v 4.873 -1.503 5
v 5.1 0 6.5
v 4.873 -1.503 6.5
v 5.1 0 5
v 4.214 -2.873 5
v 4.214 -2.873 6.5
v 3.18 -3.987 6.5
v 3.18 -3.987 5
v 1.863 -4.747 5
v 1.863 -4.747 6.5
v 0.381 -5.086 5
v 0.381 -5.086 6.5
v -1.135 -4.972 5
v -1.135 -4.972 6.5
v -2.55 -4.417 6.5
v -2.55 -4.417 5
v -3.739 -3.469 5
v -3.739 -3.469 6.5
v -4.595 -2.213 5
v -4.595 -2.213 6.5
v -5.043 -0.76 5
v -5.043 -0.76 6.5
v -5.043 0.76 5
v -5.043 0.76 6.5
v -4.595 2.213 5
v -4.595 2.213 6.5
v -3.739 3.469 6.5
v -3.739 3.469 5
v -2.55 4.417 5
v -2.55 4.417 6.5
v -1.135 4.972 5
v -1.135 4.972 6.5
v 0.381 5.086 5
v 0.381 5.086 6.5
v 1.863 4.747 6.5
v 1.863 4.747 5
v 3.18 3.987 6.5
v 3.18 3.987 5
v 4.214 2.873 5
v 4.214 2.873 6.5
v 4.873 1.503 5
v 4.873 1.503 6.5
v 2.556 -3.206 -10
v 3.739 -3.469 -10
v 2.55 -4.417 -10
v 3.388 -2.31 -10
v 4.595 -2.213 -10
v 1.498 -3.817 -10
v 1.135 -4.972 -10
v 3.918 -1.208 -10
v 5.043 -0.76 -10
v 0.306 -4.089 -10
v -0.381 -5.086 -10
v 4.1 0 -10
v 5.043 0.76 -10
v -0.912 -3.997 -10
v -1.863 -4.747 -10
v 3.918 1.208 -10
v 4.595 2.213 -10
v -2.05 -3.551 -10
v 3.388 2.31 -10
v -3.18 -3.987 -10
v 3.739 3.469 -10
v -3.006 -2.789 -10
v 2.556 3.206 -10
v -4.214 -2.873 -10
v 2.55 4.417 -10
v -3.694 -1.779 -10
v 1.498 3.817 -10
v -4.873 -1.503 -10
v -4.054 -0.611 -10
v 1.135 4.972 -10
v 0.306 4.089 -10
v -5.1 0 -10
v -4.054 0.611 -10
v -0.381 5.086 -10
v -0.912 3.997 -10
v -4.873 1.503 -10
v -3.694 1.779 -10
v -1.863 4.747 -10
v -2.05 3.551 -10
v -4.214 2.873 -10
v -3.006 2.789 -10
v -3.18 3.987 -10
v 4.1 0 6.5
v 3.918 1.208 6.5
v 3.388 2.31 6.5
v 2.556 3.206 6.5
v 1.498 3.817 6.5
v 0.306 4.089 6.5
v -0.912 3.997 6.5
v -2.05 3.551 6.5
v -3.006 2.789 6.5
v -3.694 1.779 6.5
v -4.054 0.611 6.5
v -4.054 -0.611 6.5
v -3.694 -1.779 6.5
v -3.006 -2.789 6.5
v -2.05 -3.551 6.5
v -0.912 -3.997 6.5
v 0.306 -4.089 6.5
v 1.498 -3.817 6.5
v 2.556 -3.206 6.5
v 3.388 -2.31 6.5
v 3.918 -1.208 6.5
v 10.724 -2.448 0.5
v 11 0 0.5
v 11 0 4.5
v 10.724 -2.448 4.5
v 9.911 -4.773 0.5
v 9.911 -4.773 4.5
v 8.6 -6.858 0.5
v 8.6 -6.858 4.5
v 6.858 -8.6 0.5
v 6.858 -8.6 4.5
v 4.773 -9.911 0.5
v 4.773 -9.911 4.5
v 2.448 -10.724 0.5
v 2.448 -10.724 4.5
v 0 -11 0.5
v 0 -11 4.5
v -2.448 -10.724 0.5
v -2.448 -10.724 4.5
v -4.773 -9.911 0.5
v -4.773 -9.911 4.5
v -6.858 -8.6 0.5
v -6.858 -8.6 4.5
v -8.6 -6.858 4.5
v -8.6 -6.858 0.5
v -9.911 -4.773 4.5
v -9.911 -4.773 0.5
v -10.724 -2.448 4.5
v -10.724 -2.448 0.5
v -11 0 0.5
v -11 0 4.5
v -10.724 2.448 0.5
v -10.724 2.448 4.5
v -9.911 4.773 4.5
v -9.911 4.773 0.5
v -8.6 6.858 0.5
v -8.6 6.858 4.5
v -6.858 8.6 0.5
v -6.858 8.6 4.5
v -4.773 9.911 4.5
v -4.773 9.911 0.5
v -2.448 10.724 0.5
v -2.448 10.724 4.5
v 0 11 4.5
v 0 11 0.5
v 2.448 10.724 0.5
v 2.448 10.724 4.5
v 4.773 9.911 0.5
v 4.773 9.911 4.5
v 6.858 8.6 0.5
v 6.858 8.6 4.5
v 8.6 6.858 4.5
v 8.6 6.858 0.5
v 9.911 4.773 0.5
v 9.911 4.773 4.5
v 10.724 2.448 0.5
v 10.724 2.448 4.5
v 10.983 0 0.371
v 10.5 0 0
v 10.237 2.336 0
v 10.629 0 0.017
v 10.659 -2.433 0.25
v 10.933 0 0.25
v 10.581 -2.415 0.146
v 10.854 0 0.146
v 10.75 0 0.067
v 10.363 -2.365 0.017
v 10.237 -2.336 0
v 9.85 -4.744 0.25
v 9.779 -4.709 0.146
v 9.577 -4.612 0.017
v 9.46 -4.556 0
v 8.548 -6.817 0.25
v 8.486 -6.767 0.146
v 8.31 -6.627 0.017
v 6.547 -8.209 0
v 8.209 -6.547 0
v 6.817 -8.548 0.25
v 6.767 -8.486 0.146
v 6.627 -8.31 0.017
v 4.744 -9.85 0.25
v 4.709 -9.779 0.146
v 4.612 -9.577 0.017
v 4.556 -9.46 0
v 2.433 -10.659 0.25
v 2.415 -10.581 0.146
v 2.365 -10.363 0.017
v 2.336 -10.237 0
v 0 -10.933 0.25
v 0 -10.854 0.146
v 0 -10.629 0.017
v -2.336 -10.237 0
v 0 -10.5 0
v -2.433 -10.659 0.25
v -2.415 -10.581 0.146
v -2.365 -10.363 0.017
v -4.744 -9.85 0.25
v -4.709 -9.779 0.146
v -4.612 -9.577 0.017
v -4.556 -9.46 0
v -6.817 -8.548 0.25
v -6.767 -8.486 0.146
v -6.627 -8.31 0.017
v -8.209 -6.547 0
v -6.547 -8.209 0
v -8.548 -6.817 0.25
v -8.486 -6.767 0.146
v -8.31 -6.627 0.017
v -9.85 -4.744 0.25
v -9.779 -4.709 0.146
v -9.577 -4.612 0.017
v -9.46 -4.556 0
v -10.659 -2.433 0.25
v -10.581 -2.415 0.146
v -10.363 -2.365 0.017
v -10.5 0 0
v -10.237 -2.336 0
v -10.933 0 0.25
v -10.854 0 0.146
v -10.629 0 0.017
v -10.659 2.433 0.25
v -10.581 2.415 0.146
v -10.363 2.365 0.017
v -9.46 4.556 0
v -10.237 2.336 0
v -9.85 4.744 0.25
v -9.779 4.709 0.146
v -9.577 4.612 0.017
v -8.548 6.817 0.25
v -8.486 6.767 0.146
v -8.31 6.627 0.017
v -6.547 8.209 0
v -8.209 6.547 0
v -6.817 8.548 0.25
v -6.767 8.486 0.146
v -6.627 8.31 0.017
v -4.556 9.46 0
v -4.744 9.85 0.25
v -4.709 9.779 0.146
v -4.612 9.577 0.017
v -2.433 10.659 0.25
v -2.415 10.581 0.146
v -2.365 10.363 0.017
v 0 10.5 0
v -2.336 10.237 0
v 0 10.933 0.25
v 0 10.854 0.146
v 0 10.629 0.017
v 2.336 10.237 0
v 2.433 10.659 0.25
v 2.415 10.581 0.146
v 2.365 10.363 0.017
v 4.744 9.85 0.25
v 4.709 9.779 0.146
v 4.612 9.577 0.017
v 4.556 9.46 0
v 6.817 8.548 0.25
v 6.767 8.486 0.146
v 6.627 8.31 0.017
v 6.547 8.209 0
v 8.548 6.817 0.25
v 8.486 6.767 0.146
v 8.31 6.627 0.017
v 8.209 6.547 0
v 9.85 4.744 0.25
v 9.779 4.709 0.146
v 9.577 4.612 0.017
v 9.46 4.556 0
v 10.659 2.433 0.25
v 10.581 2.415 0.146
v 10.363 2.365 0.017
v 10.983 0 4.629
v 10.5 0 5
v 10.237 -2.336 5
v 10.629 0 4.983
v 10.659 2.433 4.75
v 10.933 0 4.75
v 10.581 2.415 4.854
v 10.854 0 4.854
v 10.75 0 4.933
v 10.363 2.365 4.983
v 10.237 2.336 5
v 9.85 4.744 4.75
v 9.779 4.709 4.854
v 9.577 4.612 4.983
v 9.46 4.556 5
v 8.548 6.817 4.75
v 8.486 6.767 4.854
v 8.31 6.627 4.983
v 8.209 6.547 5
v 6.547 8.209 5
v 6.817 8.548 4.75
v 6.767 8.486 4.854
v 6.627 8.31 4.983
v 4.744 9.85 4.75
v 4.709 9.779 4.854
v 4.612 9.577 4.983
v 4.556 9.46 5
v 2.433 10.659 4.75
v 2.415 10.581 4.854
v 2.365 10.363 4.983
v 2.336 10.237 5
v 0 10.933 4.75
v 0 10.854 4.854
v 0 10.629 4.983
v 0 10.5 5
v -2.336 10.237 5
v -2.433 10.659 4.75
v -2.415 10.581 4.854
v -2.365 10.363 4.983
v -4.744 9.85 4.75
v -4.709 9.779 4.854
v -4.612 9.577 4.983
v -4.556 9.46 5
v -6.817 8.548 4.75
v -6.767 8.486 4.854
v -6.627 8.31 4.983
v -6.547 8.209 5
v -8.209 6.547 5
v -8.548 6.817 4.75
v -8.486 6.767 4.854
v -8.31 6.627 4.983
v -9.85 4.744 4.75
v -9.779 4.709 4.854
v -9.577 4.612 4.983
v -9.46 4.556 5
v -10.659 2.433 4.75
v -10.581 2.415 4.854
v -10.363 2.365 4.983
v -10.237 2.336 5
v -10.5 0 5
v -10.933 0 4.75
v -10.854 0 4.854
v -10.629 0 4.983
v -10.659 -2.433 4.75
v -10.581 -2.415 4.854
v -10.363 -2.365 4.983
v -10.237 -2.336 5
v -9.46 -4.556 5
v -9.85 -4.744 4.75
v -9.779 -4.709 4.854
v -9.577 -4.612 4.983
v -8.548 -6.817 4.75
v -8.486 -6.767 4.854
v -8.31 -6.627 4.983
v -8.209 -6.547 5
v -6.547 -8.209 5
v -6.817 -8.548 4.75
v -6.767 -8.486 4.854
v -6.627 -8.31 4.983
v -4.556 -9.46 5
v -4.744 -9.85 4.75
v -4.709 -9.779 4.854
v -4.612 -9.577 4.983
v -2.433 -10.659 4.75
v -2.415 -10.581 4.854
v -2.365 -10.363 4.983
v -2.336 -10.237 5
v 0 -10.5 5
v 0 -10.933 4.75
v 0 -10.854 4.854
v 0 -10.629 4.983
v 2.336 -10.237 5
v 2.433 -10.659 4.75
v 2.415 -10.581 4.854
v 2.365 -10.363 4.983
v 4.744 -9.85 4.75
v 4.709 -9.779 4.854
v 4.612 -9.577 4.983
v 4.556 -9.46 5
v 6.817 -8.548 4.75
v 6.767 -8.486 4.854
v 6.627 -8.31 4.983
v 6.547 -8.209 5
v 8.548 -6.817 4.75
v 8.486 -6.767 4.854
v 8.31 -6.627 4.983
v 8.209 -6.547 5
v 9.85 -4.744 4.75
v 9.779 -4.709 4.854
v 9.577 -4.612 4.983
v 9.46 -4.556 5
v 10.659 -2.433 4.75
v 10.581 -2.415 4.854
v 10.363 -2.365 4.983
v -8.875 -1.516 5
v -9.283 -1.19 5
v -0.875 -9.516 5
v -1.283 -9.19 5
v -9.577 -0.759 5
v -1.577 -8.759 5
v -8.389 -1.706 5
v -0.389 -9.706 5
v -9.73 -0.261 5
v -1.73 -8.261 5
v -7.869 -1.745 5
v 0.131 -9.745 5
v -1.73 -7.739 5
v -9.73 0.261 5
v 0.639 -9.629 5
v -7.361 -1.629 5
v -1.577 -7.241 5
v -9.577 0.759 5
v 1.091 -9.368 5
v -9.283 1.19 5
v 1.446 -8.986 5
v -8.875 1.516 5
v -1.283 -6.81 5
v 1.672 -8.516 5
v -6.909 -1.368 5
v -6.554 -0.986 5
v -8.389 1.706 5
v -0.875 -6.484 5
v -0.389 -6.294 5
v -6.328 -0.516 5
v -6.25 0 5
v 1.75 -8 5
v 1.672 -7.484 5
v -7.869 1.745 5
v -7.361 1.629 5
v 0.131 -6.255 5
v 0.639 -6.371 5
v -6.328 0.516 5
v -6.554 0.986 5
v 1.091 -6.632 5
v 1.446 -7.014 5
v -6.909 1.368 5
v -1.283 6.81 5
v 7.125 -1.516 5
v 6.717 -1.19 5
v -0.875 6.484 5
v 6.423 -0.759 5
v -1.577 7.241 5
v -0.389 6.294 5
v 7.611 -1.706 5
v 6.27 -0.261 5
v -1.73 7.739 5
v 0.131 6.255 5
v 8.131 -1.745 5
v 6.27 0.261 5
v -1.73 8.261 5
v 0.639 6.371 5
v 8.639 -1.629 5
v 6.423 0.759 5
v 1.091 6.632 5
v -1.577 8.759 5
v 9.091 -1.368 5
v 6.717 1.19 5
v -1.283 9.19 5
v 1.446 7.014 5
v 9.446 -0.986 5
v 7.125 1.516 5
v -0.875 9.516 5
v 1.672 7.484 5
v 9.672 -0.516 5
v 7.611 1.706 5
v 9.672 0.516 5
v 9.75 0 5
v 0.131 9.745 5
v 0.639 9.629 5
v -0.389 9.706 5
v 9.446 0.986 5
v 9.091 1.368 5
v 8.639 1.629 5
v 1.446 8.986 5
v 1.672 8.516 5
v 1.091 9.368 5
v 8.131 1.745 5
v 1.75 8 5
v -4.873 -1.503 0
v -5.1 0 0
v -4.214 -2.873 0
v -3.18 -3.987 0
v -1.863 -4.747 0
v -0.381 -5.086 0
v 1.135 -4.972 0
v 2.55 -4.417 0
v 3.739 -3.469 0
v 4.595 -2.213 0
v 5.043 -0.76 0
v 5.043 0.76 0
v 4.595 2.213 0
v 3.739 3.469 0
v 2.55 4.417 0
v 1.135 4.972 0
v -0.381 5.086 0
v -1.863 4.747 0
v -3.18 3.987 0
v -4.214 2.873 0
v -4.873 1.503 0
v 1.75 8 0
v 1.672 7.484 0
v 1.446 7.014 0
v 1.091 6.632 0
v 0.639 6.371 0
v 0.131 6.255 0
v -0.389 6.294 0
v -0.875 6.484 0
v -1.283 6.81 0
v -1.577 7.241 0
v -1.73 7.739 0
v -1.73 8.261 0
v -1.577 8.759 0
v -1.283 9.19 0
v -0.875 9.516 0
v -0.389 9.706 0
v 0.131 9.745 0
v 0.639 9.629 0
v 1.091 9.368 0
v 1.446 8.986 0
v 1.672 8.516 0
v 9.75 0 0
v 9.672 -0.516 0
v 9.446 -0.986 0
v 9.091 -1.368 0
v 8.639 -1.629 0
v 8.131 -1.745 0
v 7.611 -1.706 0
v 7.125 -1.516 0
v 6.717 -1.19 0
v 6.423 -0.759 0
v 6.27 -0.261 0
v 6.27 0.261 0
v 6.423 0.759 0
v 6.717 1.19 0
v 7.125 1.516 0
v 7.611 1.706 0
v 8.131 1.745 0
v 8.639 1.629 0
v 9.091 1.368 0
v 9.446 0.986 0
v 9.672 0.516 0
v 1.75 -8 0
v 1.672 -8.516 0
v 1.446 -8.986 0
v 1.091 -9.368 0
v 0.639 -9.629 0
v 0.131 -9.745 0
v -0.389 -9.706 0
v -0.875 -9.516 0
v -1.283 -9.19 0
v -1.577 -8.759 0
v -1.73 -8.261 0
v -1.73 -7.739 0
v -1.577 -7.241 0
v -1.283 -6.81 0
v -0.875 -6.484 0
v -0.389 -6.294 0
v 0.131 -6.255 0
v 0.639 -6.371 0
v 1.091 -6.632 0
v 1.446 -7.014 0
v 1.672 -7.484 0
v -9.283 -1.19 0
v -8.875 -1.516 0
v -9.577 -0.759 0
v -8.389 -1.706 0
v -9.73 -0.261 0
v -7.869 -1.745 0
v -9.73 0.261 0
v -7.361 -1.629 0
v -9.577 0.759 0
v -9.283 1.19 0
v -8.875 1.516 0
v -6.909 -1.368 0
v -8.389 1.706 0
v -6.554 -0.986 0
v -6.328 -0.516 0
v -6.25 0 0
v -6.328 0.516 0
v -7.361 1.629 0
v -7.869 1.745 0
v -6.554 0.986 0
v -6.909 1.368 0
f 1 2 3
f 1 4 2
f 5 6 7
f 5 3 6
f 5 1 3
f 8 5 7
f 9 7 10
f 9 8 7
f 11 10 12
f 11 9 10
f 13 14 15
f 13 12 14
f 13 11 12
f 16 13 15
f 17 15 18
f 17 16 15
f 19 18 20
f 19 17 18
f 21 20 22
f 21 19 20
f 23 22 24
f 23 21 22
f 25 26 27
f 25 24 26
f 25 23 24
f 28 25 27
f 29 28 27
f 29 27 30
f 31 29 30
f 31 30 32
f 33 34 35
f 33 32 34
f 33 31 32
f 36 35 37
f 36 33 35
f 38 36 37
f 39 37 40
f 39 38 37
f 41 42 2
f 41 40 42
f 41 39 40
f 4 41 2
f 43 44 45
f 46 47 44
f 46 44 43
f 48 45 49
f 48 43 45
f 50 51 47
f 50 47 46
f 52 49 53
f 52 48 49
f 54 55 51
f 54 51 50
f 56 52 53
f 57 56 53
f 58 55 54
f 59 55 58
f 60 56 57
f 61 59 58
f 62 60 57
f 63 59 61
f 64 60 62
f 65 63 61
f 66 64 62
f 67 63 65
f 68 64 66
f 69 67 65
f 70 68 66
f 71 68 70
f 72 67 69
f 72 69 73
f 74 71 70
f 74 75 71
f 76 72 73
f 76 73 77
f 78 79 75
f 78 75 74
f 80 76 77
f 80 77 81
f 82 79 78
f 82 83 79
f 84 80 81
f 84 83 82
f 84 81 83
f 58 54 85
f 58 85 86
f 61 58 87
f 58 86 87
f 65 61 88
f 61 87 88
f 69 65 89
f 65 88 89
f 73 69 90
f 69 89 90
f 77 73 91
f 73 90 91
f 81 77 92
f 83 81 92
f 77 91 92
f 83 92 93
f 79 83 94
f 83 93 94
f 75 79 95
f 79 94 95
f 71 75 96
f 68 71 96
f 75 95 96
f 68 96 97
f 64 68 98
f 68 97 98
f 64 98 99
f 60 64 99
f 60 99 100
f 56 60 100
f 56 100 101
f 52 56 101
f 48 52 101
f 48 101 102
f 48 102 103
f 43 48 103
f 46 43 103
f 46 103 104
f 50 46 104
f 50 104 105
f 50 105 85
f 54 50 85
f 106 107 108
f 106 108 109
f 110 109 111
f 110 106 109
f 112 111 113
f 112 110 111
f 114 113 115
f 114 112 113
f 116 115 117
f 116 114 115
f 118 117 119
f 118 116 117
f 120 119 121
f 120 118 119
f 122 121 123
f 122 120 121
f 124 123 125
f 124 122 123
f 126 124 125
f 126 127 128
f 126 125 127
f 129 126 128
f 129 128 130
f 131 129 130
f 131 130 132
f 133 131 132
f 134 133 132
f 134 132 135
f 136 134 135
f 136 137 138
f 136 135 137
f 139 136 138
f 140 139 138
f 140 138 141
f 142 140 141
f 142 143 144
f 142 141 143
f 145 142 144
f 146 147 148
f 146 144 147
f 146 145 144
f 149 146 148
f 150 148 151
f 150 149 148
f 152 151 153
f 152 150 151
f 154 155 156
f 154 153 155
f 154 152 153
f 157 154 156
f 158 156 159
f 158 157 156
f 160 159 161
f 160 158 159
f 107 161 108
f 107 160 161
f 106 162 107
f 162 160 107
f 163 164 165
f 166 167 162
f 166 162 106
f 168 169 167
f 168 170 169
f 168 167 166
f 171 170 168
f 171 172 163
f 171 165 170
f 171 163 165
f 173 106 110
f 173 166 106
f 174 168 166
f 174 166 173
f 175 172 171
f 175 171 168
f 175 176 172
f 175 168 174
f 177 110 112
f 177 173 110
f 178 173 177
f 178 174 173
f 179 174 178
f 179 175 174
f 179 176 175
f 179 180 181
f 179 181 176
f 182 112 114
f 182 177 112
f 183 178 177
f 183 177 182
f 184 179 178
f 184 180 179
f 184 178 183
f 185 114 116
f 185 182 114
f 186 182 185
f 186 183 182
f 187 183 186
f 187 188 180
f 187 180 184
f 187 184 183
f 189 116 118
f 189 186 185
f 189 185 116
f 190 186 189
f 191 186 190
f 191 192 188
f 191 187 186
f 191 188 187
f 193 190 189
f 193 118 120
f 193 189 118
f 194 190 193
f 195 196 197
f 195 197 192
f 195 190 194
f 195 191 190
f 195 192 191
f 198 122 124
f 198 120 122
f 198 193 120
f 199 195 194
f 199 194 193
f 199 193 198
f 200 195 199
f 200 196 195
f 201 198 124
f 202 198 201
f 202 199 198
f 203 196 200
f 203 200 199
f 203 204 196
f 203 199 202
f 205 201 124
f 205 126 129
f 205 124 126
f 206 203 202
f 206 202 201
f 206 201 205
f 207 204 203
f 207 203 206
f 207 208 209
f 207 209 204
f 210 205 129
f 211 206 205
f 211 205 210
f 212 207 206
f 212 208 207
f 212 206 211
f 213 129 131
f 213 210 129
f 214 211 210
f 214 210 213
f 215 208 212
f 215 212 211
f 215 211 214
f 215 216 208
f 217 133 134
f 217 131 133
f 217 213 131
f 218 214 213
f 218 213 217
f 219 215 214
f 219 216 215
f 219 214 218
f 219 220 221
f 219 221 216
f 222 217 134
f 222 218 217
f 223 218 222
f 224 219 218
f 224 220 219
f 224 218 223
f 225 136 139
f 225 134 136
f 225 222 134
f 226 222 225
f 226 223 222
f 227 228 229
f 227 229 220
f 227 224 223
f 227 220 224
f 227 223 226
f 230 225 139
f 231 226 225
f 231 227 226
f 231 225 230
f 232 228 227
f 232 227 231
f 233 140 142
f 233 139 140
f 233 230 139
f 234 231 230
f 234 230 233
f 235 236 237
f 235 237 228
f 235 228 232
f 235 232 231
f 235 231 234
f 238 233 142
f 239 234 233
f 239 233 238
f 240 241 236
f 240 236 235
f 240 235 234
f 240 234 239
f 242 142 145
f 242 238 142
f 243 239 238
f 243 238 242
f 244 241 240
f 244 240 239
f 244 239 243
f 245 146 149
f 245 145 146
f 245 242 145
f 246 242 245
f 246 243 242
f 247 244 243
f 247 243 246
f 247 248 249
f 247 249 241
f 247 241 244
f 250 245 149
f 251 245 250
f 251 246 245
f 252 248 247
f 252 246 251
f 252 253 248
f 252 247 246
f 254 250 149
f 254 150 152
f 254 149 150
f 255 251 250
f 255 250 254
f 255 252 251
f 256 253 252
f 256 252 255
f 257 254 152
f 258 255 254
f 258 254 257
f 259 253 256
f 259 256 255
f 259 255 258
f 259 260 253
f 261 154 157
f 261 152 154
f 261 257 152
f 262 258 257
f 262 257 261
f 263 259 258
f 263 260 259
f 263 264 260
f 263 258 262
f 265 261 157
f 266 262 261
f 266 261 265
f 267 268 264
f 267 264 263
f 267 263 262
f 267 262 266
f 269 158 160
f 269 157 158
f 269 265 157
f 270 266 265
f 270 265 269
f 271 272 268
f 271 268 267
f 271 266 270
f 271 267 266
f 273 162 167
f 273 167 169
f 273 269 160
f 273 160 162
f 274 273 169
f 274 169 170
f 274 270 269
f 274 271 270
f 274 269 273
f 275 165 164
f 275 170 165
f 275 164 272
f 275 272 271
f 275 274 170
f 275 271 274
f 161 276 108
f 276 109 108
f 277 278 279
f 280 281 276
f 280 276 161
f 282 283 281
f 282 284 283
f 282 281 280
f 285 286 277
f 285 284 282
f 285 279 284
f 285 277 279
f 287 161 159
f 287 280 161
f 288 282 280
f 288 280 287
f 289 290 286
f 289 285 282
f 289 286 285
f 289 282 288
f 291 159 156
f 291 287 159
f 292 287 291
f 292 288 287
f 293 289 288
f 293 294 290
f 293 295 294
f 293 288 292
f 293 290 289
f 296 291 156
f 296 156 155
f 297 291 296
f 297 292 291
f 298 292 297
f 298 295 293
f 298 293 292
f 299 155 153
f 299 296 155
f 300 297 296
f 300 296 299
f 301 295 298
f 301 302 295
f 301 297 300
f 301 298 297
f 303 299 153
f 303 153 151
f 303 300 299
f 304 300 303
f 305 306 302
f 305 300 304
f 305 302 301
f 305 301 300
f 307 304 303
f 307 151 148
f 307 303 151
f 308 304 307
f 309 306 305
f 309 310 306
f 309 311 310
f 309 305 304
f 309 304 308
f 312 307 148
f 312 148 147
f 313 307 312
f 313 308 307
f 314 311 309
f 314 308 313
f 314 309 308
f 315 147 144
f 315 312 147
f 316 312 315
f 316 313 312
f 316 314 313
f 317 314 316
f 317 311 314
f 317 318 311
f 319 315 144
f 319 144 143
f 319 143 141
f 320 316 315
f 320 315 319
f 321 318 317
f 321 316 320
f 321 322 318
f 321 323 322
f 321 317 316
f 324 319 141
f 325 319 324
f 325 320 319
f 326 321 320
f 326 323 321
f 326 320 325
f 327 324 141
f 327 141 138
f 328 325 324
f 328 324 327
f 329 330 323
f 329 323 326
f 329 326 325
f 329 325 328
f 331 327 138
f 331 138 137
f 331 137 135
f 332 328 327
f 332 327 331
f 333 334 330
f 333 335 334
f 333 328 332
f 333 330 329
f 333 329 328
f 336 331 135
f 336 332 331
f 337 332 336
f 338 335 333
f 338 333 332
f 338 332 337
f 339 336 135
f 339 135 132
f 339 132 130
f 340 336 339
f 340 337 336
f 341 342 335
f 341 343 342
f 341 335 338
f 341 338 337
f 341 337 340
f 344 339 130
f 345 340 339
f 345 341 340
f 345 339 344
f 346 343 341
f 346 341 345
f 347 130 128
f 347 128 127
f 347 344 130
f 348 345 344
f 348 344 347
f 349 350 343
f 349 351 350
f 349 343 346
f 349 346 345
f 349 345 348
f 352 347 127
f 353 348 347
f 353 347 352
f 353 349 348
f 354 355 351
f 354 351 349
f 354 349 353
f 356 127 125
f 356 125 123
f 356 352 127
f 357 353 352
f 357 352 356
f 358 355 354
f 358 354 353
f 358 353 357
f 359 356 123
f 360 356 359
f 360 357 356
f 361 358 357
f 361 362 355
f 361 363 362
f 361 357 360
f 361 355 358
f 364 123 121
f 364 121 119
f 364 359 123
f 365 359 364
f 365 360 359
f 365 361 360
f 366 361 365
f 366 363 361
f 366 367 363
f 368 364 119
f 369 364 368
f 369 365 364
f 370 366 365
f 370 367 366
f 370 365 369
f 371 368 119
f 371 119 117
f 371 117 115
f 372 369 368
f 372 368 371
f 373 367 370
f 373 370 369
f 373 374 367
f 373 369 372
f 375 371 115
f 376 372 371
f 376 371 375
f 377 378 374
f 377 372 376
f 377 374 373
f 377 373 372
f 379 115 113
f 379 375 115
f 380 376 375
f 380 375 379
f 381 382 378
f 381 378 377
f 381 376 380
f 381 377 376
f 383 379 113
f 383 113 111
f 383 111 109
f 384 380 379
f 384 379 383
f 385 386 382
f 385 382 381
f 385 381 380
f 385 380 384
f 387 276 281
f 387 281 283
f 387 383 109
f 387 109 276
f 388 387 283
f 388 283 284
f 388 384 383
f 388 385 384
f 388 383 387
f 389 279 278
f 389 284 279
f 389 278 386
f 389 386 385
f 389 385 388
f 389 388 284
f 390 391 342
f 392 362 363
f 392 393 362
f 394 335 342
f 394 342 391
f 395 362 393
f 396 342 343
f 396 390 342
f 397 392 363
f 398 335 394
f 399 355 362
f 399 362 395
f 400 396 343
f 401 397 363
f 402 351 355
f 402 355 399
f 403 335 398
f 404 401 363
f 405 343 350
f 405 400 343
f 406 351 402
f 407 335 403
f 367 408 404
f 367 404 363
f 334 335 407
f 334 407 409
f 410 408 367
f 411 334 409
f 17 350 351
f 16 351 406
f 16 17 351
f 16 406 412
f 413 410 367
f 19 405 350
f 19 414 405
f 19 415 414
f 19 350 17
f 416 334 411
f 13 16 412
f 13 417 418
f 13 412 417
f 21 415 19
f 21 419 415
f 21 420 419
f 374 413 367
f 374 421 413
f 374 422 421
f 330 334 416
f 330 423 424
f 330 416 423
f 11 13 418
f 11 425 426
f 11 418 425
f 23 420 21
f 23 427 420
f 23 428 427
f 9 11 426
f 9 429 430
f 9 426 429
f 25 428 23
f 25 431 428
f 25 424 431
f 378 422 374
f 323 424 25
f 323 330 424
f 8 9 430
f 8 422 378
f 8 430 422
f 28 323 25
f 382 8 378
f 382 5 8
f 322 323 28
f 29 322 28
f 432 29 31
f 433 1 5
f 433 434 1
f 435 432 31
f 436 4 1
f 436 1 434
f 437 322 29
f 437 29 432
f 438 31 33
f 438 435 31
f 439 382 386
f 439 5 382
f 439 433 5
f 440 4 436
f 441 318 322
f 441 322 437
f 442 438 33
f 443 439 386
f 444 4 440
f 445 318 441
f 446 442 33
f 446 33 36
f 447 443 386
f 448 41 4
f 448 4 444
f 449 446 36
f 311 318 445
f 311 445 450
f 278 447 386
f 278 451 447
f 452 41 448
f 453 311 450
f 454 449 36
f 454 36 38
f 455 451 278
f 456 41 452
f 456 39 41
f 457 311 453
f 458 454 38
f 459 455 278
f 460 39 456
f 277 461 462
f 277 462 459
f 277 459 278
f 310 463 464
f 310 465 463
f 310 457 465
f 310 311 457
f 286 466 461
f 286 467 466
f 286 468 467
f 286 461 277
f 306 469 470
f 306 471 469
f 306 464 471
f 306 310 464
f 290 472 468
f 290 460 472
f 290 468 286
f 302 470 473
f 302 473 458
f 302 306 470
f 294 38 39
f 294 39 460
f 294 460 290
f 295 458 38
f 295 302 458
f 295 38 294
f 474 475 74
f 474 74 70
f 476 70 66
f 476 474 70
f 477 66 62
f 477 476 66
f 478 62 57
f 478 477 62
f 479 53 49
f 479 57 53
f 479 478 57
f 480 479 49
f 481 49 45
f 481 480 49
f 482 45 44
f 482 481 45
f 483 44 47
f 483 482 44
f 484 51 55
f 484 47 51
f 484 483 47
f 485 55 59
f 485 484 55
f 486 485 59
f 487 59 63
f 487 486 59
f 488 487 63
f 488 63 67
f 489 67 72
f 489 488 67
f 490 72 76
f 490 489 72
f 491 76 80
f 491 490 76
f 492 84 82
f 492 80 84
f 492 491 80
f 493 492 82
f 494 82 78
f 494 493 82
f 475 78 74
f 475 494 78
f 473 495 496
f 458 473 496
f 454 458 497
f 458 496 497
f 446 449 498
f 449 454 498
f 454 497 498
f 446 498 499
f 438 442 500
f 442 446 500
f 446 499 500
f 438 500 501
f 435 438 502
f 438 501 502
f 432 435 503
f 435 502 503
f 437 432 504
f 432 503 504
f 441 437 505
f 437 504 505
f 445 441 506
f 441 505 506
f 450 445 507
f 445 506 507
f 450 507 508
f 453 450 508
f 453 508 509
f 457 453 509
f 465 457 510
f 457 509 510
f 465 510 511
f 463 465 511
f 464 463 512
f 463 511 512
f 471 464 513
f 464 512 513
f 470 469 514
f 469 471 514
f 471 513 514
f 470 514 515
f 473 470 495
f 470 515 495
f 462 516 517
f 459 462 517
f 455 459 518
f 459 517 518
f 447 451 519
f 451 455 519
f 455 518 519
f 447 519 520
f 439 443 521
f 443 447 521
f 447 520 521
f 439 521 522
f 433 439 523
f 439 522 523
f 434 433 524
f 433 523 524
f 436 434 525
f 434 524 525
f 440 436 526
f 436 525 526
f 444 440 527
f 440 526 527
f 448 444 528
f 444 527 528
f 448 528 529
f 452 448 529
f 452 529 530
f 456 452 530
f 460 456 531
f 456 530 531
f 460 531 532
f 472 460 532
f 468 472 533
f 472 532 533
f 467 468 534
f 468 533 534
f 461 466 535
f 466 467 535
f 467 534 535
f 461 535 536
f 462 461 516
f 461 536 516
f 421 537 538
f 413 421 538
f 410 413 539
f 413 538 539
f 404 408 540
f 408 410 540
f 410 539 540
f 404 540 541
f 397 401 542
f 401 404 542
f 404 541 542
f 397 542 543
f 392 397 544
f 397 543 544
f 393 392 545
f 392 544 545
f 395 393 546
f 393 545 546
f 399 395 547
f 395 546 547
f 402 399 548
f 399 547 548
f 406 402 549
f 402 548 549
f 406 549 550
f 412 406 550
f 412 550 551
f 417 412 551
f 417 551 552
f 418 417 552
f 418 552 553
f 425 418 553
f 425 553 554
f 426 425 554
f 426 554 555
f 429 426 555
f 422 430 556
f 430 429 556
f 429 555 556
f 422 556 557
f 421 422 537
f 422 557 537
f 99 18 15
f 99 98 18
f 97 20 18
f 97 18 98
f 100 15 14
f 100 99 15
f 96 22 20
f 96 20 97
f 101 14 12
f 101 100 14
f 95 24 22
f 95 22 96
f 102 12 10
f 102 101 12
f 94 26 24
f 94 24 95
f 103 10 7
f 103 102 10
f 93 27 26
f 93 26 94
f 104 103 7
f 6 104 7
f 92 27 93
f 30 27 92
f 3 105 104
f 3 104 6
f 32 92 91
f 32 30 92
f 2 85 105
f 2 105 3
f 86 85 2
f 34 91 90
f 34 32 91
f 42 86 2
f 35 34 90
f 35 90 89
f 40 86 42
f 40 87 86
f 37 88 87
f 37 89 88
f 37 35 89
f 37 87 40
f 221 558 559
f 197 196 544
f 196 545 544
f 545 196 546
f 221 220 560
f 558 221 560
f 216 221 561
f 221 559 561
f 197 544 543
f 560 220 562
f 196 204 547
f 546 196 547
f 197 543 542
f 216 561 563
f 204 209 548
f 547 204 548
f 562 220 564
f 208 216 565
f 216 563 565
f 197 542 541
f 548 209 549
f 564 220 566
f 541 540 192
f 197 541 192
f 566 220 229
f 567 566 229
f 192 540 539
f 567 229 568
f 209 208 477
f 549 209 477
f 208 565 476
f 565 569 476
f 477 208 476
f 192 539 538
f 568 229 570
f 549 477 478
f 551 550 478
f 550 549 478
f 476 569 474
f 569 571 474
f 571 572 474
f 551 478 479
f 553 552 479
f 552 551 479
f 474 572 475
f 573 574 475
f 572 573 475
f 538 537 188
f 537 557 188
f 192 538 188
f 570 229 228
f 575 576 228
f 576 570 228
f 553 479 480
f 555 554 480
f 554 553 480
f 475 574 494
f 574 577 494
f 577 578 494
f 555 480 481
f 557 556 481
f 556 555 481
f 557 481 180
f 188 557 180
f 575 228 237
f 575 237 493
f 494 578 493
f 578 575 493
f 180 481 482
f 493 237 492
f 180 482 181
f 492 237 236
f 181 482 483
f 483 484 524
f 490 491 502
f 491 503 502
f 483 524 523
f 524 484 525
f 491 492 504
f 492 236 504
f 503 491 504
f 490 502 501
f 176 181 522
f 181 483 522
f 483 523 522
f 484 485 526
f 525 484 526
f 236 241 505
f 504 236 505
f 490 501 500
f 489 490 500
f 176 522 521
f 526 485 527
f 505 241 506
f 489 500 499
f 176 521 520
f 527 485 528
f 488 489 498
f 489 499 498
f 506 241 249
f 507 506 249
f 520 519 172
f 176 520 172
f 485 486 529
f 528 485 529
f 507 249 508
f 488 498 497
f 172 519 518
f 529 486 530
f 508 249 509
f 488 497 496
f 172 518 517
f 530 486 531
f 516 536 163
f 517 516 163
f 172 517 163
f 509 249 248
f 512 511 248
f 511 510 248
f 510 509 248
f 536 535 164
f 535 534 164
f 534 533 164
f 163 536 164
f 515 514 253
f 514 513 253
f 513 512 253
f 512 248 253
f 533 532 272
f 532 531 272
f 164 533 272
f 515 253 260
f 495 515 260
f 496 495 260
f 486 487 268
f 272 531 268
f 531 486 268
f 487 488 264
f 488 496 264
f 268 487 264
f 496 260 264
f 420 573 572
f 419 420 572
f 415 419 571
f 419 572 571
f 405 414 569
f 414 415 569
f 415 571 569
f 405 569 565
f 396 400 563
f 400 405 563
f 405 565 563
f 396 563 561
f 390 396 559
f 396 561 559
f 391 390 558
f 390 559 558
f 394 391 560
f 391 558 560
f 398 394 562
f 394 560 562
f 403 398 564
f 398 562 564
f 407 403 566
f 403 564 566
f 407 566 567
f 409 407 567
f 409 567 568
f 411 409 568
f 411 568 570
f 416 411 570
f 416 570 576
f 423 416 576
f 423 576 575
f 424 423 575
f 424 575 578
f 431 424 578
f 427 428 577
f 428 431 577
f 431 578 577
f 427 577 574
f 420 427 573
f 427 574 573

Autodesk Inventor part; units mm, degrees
ref_plane "YZ Plane" through (0, 0, 0) normal (1, 0, 0) x (0, 1, 0)
ref_plane "XZ Plane" through (0, 0, 0) normal (0, 1, 0) x (-1, 0, 0)
ref_plane "XY Plane" through (0, 0, 0) normal (0, 0, 1) x (1, 0, 0)
sketch "Sketch1" plane through (0, 0, 0) normal (0, 0, 1) x (1, 0, 0)
  circle A0 centre (0, 0) radius 11
  circle A1 centre (0, 0) radius 8 construction
  line L0 (0, 0) -> (0, 8) construction
  circle A2 centre (0, 8) radius 1.75
  line L1 (0, 0) -> (-8, 0) construction
  circle A3 centre (-8, 0) radius 1.75
  line L2 (0, 0) -> (0, -8) construction
  circle A4 centre (0, -8) radius 1.75
  line L3 (0, 0) -> (8, 0) construction
  circle A5 centre (8, 0) radius 1.75
  dimension "d1" = 16
  dimension "d0" = 22
  dimension "d2" = 3.5
  dimension "d5" = 360
extrude "Extrusion1" add sketch "Sketch1" along normal blind 5
sketch "Sketch2" plane through (0, 0, 5) normal (0, 0, 1) x (1, 0, 0)
  circle A0 centre (0, 0) radius 5.1
  dimension "d10" = 10.2
sketch "Sketch3" plane through (0, 0, 0) normal (0, 0, -1) x (-1, 0, 0)
  point P0 (0, 0)
extrude "Extrusion2" add sketch "Sketch2" along normal blind 1.5
sketch "Sketch4" plane through (0, 0, 0) normal (0, 0, -1) x (-1, 0, 0)
  circle A0 centre (0, 0) radius 5.1
  dimension "d13" = 10.2
extrude "Extrusion3" add sketch "Sketch4" along normal blind 10
sketch "Sketch5" plane through (0, 0, 6.5) normal (0, 0, 1) x (1, 0, 0)
  circle A0 centre (0, 0) radius 4.1
  dimension "d16" = 8.2
extrude "Extrusion4" cut sketch "Sketch5" against normal blind 19.5
thread "Thread1" size "M9x1.25" class "6H" standard "ANSI Metric M Profile" length 4000
fillet "Fillet1" radius 0.5 2 edges at (-11, 0, 5) (-11, 0, 0)
properties part number "LeadNut"
